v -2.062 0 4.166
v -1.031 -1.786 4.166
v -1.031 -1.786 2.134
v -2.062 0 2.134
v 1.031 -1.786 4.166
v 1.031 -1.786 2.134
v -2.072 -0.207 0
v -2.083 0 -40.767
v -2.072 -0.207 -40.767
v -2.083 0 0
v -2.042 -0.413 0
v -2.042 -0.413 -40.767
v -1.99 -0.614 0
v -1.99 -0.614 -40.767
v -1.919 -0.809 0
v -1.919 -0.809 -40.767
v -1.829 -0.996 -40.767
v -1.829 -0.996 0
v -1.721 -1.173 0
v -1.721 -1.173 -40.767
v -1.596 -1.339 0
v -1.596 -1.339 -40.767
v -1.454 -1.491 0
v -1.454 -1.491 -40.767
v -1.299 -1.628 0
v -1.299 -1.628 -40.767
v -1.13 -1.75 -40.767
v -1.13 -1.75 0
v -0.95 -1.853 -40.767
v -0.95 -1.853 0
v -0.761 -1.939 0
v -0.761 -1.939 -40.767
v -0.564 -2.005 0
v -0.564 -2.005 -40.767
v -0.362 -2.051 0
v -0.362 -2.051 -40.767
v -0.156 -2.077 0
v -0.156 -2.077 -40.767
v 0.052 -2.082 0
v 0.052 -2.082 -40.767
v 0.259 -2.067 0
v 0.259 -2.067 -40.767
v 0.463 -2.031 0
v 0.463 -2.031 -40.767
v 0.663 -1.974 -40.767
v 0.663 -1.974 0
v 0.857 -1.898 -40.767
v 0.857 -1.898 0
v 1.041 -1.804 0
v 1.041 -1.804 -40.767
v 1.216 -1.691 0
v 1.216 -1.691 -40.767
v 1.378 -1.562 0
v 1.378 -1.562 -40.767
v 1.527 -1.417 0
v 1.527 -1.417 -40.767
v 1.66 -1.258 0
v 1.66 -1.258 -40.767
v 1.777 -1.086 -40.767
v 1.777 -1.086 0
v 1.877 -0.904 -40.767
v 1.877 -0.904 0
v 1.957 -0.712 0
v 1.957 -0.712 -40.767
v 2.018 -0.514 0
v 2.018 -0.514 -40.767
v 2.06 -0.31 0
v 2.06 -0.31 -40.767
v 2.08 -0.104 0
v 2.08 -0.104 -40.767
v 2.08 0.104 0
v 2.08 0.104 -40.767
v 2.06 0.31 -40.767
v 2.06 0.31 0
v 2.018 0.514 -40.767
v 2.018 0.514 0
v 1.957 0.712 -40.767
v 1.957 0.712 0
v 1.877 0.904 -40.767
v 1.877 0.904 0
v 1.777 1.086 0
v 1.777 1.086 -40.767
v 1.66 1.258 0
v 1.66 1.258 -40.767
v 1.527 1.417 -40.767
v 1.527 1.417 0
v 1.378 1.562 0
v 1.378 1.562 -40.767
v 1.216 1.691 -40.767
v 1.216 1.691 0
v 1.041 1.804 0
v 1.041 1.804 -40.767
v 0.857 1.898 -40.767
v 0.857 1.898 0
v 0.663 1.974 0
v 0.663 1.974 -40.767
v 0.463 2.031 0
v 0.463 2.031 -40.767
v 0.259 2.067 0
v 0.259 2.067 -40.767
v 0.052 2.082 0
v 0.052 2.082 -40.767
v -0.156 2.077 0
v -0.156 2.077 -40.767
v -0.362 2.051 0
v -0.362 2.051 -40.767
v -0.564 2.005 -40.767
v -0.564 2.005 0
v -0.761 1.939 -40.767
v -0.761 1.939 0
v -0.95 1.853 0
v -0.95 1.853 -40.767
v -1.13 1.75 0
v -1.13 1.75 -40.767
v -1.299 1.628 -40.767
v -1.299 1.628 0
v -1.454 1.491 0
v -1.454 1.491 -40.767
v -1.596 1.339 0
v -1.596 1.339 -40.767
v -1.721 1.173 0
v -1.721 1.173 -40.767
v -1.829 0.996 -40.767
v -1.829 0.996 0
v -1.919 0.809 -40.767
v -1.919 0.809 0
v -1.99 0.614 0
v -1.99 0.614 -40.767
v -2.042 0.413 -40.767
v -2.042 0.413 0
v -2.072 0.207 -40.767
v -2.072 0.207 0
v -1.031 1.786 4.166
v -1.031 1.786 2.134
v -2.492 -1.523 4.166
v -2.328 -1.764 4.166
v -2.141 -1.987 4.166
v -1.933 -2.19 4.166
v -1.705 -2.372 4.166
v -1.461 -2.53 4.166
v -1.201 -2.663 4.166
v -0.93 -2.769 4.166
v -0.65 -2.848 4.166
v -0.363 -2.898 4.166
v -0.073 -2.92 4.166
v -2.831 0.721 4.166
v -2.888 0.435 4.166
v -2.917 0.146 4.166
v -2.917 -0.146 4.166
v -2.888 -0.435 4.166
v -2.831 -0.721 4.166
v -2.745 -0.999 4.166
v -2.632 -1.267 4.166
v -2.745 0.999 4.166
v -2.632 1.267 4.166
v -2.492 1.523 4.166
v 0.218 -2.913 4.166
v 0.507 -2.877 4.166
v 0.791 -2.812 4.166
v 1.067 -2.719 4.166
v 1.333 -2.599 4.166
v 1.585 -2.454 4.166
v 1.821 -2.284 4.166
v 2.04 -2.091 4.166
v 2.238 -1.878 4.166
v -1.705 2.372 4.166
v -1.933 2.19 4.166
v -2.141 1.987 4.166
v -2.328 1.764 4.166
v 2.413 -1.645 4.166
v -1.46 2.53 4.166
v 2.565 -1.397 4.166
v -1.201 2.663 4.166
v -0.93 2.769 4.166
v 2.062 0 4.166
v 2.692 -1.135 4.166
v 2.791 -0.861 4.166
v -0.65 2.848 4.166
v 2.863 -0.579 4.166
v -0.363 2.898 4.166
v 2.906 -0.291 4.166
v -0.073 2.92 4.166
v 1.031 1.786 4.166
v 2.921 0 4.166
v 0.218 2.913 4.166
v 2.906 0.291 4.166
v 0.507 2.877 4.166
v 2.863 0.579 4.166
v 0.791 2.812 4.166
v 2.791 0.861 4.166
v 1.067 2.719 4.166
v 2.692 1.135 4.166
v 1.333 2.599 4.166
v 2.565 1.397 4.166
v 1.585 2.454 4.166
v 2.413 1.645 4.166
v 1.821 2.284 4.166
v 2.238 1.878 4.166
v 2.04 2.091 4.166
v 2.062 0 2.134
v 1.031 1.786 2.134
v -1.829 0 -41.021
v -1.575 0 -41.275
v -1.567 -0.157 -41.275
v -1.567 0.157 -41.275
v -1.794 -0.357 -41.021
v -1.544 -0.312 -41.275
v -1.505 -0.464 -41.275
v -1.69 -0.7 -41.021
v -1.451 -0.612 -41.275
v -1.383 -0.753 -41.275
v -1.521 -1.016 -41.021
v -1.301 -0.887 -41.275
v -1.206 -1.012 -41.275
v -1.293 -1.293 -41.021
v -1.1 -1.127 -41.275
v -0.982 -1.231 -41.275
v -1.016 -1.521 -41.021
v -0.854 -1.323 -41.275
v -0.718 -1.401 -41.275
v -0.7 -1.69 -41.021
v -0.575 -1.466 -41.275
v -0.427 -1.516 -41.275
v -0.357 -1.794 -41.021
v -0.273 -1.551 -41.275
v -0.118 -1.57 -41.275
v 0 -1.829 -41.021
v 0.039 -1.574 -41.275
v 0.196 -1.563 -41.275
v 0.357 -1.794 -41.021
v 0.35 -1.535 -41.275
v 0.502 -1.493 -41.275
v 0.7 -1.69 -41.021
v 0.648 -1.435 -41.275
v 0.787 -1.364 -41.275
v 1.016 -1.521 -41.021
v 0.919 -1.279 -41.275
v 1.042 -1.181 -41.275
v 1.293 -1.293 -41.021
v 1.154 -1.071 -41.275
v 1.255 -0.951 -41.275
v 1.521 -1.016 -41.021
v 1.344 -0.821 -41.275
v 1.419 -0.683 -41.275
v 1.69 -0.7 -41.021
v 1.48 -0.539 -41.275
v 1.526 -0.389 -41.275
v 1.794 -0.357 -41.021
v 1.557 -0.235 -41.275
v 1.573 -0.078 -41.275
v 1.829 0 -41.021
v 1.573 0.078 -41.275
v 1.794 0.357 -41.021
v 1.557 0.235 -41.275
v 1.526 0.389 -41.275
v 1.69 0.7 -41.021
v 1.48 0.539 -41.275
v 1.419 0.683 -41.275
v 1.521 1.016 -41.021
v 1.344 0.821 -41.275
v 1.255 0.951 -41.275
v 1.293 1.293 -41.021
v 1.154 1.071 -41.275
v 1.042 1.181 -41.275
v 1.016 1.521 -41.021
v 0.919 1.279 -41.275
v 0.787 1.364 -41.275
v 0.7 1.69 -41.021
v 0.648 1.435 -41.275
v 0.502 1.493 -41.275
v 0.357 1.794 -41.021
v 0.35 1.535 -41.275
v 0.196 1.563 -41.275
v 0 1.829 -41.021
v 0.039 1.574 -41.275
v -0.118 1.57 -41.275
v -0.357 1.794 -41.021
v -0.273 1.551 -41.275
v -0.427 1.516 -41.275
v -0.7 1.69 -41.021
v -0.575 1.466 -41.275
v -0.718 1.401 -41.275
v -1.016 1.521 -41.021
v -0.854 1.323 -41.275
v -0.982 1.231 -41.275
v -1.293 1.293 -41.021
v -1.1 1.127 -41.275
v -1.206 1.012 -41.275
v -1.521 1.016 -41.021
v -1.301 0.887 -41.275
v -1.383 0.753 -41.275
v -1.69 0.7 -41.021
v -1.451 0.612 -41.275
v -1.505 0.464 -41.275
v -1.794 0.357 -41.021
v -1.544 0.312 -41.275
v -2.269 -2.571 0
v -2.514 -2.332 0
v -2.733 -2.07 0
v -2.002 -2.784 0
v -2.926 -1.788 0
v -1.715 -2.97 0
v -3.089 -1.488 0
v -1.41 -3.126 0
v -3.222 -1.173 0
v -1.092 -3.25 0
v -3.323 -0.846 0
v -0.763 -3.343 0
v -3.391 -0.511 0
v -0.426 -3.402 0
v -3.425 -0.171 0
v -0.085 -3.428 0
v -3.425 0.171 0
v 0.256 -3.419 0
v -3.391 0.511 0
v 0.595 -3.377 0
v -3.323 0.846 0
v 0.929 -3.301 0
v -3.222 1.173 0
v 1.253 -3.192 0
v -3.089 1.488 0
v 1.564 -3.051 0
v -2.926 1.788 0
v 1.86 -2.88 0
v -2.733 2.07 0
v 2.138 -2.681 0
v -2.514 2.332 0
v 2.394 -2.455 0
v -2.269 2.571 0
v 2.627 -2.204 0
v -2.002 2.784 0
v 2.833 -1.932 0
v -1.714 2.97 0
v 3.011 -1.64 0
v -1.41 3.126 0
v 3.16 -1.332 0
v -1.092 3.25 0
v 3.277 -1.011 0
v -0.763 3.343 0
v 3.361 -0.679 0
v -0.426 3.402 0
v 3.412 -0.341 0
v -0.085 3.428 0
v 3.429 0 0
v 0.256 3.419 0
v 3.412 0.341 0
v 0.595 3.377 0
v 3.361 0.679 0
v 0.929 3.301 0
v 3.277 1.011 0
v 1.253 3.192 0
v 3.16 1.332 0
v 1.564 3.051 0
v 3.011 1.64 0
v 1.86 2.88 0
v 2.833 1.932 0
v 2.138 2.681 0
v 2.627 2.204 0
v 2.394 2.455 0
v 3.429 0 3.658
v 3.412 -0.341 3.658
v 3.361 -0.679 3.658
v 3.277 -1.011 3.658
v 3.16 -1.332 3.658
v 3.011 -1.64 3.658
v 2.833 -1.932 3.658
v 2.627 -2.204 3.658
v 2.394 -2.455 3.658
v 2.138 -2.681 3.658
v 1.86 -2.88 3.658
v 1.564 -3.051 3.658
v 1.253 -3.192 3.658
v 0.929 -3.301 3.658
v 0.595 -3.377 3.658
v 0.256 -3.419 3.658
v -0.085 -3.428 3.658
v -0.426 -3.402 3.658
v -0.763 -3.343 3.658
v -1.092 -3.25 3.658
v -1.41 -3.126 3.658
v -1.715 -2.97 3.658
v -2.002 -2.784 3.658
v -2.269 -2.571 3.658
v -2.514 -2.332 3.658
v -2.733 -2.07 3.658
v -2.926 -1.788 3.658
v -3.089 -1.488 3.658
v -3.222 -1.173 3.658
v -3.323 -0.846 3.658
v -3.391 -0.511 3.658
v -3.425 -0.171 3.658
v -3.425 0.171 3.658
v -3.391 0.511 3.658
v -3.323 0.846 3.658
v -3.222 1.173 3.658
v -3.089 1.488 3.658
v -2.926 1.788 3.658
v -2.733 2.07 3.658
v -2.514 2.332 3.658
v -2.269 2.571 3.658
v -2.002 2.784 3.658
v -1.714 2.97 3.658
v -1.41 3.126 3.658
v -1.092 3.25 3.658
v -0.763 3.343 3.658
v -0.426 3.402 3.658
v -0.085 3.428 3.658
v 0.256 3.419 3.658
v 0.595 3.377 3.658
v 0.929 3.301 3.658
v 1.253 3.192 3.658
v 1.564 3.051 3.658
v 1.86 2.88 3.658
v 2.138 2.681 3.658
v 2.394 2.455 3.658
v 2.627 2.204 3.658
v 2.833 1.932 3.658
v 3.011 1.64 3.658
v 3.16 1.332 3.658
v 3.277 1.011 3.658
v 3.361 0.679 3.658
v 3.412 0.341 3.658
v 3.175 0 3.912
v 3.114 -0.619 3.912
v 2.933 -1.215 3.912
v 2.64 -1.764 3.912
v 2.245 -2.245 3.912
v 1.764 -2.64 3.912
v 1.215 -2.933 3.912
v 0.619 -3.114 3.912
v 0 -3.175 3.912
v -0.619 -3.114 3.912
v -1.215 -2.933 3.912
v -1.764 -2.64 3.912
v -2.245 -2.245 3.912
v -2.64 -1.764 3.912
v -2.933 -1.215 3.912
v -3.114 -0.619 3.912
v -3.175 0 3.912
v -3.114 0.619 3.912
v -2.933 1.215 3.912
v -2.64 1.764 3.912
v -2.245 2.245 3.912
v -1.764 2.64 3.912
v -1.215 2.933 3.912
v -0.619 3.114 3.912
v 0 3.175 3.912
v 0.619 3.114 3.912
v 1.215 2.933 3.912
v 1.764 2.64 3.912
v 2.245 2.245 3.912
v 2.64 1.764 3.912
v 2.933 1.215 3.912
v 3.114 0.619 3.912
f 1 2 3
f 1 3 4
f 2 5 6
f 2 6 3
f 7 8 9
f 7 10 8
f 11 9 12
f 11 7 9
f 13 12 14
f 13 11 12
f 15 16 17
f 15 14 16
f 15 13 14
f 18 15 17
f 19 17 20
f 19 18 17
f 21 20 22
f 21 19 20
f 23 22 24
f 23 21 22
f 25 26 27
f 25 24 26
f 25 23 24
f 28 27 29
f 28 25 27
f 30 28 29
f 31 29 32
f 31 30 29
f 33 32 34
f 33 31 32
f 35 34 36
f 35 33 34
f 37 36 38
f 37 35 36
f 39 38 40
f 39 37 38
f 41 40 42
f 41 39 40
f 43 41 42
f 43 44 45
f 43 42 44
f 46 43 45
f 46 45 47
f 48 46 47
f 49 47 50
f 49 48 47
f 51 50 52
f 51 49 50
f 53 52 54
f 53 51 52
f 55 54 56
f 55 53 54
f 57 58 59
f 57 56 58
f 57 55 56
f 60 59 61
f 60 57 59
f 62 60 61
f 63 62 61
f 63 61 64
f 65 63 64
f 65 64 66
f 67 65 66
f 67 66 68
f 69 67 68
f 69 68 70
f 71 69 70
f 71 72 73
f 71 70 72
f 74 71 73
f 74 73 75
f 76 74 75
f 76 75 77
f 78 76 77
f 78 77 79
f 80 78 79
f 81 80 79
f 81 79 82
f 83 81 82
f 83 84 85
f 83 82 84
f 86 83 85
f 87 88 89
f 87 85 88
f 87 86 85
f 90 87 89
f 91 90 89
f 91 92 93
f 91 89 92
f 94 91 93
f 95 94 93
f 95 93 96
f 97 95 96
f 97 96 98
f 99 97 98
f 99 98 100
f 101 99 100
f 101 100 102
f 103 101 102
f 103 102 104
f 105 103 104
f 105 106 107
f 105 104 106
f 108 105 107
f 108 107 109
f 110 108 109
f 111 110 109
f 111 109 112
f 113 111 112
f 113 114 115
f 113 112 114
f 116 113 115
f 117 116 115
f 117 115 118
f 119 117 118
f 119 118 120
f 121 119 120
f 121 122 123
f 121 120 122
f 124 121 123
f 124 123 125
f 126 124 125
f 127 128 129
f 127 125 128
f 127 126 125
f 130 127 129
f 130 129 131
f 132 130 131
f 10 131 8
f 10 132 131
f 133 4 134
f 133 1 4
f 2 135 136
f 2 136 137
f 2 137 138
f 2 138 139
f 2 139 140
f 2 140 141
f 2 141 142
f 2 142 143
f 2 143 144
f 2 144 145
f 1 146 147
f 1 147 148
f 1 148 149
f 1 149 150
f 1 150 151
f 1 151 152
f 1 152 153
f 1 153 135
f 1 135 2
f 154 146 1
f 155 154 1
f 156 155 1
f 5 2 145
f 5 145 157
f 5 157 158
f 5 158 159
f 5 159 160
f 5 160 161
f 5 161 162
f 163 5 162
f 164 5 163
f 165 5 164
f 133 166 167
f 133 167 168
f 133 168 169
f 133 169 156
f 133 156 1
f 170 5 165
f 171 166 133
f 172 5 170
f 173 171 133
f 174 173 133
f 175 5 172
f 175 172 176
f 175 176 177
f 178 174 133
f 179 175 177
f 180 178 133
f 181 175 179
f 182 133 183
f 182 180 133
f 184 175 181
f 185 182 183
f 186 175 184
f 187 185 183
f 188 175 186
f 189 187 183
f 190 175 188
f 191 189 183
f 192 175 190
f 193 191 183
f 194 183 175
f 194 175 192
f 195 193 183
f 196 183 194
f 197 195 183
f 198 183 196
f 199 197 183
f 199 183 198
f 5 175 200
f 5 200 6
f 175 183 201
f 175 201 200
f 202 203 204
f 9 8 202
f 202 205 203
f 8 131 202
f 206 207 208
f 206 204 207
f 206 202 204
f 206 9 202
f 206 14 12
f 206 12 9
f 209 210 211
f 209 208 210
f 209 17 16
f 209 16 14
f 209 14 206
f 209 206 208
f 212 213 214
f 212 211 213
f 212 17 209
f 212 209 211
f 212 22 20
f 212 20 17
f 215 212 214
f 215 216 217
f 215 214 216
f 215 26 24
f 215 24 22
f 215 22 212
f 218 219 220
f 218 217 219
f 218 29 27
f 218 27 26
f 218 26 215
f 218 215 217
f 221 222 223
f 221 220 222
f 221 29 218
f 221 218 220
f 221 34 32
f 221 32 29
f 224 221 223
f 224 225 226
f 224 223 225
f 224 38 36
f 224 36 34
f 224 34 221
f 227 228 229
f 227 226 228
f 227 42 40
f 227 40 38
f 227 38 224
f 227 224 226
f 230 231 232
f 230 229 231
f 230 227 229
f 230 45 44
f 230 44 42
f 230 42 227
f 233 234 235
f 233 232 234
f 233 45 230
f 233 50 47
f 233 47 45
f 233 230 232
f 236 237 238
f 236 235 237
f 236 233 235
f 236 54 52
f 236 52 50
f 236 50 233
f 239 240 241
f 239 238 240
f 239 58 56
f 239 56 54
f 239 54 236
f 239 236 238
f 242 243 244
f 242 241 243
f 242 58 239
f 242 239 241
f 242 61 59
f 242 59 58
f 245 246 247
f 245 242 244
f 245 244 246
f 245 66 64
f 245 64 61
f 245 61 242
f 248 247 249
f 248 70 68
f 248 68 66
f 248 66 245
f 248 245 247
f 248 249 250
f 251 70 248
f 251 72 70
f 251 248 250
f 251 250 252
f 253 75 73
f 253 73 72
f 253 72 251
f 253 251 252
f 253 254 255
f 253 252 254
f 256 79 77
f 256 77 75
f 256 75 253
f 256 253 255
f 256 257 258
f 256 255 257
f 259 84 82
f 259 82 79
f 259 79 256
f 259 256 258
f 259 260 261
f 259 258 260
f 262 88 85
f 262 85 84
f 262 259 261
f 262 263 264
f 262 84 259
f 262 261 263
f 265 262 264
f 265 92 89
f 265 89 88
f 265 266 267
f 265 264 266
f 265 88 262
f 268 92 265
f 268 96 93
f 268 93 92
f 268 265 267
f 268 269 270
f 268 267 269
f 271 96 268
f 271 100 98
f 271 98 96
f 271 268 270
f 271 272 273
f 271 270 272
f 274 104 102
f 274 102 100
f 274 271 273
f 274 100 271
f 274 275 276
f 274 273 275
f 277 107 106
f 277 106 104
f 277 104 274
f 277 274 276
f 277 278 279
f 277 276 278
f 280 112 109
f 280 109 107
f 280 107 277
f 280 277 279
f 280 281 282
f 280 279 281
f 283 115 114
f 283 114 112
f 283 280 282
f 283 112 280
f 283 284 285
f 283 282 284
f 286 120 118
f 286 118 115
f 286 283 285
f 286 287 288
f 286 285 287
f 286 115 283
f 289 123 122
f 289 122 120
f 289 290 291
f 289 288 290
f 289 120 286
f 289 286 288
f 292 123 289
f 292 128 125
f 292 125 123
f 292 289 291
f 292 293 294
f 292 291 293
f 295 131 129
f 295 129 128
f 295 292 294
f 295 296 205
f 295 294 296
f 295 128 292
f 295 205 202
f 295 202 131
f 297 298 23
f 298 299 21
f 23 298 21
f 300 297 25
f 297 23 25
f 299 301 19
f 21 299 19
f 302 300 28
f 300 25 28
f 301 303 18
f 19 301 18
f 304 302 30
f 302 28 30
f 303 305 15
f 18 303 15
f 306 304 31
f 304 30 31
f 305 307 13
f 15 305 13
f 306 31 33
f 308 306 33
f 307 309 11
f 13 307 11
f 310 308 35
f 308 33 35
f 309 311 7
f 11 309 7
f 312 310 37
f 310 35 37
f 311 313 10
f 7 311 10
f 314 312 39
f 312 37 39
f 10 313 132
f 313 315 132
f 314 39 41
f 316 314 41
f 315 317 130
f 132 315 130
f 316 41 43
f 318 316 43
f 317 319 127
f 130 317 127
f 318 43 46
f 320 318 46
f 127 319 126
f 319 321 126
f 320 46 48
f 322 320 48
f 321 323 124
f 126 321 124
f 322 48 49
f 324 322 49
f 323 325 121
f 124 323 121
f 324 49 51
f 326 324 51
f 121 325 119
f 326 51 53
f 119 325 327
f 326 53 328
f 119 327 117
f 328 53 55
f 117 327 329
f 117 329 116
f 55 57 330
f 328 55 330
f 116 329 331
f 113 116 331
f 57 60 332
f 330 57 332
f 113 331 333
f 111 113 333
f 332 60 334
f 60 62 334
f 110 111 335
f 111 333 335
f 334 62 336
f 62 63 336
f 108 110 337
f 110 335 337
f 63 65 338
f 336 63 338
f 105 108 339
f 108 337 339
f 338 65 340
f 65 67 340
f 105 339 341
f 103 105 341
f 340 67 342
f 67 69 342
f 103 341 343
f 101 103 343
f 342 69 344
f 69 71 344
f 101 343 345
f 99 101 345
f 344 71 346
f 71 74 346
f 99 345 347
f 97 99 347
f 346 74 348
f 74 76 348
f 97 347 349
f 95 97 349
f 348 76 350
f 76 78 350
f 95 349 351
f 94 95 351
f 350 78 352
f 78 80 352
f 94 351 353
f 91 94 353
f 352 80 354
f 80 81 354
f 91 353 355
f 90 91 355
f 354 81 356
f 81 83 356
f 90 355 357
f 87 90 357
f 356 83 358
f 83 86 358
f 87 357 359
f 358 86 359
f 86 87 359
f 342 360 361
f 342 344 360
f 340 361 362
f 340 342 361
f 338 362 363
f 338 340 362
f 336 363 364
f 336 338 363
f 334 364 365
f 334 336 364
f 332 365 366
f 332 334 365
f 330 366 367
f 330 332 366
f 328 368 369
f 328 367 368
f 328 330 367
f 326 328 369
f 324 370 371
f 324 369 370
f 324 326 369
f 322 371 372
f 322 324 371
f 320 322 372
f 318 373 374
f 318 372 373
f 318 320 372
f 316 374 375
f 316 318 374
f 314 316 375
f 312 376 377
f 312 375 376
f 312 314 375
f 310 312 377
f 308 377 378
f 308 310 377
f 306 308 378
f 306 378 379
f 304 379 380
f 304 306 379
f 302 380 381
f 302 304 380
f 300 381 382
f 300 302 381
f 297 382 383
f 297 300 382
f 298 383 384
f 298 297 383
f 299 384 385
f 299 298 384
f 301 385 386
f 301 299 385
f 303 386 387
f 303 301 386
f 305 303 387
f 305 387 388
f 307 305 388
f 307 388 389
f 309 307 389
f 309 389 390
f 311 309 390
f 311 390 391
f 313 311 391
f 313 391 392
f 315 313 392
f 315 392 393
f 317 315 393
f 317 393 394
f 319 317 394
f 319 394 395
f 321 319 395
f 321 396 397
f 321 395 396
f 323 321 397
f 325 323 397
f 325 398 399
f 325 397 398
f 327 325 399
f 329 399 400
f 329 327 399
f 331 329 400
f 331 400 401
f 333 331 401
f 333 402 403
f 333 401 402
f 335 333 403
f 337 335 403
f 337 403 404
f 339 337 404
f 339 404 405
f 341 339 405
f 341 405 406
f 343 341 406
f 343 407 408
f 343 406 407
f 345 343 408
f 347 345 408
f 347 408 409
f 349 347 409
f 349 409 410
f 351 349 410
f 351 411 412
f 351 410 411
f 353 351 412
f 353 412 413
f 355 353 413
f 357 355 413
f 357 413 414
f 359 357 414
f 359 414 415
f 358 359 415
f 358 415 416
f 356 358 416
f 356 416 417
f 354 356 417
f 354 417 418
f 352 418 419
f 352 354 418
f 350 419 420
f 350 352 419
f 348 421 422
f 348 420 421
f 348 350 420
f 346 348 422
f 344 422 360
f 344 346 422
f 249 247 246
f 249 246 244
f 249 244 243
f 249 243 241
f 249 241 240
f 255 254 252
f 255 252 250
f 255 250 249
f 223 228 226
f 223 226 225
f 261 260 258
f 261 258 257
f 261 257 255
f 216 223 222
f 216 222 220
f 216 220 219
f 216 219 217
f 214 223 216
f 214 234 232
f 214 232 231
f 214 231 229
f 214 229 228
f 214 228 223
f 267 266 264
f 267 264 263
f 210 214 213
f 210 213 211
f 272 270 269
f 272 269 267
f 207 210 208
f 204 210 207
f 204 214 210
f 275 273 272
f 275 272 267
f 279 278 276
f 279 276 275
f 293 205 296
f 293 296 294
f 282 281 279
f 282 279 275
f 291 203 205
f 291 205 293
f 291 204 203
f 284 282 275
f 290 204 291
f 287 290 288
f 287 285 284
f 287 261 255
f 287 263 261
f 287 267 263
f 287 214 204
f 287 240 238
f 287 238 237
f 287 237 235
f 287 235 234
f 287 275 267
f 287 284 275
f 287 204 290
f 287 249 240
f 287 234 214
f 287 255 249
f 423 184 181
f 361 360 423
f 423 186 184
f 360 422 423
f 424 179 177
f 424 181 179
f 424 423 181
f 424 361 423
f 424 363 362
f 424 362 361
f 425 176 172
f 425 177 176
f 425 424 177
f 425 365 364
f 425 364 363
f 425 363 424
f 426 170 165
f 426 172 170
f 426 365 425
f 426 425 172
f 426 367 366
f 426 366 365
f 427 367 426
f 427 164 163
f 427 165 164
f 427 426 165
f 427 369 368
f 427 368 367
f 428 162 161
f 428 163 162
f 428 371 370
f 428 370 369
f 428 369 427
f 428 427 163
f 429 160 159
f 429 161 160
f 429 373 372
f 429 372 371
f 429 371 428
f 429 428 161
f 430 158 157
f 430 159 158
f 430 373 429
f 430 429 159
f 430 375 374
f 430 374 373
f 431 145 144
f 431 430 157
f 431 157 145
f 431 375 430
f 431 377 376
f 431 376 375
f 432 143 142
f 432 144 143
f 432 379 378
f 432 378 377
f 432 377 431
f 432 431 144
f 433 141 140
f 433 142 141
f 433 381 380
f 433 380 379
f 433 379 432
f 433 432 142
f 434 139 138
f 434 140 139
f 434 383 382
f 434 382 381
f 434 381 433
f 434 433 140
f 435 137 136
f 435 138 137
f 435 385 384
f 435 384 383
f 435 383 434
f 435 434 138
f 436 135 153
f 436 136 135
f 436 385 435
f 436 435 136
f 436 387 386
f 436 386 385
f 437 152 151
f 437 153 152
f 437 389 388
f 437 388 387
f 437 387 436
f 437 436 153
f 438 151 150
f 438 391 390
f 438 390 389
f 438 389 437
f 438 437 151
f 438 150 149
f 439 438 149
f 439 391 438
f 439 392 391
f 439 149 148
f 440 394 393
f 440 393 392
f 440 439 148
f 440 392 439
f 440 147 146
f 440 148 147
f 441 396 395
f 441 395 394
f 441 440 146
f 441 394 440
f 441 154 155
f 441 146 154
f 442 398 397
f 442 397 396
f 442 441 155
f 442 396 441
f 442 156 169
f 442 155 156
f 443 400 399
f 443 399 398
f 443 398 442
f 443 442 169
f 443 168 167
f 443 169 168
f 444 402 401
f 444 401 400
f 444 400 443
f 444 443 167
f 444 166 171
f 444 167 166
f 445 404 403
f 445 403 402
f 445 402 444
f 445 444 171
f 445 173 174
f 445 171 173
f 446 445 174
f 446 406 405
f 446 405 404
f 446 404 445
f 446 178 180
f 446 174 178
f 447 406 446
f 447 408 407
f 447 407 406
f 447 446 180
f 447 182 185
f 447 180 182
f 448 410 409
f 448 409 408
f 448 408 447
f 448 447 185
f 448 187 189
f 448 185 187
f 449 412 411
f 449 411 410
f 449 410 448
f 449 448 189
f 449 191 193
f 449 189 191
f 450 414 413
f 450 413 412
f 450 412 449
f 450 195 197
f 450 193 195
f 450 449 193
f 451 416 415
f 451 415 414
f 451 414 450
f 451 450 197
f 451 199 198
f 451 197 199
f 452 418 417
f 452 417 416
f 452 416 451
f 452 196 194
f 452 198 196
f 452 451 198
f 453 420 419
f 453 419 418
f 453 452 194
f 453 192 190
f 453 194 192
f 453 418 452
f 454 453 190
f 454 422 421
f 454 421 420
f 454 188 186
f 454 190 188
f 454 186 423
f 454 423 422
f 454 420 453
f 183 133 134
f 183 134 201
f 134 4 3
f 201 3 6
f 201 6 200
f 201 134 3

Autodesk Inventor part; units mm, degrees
ref_plane "YZ Plane" through (0, 0, 0) normal (1, 0, 0) x (0, 1, 0)
ref_plane "XZ Plane" through (0, 0, 0) normal (0, 1, 0) x (-1, 0, 0)
ref_plane "XY Plane" through (0, 0, 0) normal (0, 0, 1) x (1, 0, 0)
sketch "Sketch1" plane through (0, 0, 0) normal (0, 0, 1) x (1, 0, 0)
  circle A0 centre (0, 0) radius 3.429
  dimension "d0" = 6.858
extrude "Extrusion1" add sketch "Sketch1" along normal blind 4.1656
sketch "Sketch2" plane through (0, 0, 0) normal (0, 0, -1) x (-1, 0, 0)
  circle A0 centre (0, 0) radius 3.429 projected
  circle A1 centre (0, 0) radius 2.0828
  dimension "d3" = 4.1656
extrude "Extrusion2" add sketch "Sketch2" along normal blind 41.275 contours A1
sketch "Sketch3" plane through (0, 0, 4.1656) normal (0, 0, 1) x (1, 0, 0)
  circle A0 centre (0, 0) radius 3.429 projected
  line L0 (-1.0311, 1.7859) -> (1.0311, 1.7859)
  line L1 (1.0311, 1.7859) -> (2.0622, 0)
  line L2 (2.0622, 0) -> (1.0311, -1.7859)
  line L3 (1.0311, -1.7859) -> (-1.0311, -1.7859)
  line L4 (-1.0311, -1.7859) -> (-2.0622, 0)
  line L5 (-2.0622, 0) -> (-1.0311, 1.7859)
  dimension "d6" = 3.5719
extrude "Extrusion3" cut sketch "Sketch3" against normal blind 2.032 contours L0 L1 L2 L3 L4 L5
thread "Thread1" size "8-32 UNC" class "2A" standard "ANSI Unified Screw Threads" length 25.4
chamfer "Chamfer1" distance 0.508 angle 45 1 edges at (2.0828, 0, -41.275)
chamfer "Chamfer2" distance 0.508 angle 45 1 edges at (-3.429, 0, 4.1656)
properties part number "10-32 x1000" material "Steel"
